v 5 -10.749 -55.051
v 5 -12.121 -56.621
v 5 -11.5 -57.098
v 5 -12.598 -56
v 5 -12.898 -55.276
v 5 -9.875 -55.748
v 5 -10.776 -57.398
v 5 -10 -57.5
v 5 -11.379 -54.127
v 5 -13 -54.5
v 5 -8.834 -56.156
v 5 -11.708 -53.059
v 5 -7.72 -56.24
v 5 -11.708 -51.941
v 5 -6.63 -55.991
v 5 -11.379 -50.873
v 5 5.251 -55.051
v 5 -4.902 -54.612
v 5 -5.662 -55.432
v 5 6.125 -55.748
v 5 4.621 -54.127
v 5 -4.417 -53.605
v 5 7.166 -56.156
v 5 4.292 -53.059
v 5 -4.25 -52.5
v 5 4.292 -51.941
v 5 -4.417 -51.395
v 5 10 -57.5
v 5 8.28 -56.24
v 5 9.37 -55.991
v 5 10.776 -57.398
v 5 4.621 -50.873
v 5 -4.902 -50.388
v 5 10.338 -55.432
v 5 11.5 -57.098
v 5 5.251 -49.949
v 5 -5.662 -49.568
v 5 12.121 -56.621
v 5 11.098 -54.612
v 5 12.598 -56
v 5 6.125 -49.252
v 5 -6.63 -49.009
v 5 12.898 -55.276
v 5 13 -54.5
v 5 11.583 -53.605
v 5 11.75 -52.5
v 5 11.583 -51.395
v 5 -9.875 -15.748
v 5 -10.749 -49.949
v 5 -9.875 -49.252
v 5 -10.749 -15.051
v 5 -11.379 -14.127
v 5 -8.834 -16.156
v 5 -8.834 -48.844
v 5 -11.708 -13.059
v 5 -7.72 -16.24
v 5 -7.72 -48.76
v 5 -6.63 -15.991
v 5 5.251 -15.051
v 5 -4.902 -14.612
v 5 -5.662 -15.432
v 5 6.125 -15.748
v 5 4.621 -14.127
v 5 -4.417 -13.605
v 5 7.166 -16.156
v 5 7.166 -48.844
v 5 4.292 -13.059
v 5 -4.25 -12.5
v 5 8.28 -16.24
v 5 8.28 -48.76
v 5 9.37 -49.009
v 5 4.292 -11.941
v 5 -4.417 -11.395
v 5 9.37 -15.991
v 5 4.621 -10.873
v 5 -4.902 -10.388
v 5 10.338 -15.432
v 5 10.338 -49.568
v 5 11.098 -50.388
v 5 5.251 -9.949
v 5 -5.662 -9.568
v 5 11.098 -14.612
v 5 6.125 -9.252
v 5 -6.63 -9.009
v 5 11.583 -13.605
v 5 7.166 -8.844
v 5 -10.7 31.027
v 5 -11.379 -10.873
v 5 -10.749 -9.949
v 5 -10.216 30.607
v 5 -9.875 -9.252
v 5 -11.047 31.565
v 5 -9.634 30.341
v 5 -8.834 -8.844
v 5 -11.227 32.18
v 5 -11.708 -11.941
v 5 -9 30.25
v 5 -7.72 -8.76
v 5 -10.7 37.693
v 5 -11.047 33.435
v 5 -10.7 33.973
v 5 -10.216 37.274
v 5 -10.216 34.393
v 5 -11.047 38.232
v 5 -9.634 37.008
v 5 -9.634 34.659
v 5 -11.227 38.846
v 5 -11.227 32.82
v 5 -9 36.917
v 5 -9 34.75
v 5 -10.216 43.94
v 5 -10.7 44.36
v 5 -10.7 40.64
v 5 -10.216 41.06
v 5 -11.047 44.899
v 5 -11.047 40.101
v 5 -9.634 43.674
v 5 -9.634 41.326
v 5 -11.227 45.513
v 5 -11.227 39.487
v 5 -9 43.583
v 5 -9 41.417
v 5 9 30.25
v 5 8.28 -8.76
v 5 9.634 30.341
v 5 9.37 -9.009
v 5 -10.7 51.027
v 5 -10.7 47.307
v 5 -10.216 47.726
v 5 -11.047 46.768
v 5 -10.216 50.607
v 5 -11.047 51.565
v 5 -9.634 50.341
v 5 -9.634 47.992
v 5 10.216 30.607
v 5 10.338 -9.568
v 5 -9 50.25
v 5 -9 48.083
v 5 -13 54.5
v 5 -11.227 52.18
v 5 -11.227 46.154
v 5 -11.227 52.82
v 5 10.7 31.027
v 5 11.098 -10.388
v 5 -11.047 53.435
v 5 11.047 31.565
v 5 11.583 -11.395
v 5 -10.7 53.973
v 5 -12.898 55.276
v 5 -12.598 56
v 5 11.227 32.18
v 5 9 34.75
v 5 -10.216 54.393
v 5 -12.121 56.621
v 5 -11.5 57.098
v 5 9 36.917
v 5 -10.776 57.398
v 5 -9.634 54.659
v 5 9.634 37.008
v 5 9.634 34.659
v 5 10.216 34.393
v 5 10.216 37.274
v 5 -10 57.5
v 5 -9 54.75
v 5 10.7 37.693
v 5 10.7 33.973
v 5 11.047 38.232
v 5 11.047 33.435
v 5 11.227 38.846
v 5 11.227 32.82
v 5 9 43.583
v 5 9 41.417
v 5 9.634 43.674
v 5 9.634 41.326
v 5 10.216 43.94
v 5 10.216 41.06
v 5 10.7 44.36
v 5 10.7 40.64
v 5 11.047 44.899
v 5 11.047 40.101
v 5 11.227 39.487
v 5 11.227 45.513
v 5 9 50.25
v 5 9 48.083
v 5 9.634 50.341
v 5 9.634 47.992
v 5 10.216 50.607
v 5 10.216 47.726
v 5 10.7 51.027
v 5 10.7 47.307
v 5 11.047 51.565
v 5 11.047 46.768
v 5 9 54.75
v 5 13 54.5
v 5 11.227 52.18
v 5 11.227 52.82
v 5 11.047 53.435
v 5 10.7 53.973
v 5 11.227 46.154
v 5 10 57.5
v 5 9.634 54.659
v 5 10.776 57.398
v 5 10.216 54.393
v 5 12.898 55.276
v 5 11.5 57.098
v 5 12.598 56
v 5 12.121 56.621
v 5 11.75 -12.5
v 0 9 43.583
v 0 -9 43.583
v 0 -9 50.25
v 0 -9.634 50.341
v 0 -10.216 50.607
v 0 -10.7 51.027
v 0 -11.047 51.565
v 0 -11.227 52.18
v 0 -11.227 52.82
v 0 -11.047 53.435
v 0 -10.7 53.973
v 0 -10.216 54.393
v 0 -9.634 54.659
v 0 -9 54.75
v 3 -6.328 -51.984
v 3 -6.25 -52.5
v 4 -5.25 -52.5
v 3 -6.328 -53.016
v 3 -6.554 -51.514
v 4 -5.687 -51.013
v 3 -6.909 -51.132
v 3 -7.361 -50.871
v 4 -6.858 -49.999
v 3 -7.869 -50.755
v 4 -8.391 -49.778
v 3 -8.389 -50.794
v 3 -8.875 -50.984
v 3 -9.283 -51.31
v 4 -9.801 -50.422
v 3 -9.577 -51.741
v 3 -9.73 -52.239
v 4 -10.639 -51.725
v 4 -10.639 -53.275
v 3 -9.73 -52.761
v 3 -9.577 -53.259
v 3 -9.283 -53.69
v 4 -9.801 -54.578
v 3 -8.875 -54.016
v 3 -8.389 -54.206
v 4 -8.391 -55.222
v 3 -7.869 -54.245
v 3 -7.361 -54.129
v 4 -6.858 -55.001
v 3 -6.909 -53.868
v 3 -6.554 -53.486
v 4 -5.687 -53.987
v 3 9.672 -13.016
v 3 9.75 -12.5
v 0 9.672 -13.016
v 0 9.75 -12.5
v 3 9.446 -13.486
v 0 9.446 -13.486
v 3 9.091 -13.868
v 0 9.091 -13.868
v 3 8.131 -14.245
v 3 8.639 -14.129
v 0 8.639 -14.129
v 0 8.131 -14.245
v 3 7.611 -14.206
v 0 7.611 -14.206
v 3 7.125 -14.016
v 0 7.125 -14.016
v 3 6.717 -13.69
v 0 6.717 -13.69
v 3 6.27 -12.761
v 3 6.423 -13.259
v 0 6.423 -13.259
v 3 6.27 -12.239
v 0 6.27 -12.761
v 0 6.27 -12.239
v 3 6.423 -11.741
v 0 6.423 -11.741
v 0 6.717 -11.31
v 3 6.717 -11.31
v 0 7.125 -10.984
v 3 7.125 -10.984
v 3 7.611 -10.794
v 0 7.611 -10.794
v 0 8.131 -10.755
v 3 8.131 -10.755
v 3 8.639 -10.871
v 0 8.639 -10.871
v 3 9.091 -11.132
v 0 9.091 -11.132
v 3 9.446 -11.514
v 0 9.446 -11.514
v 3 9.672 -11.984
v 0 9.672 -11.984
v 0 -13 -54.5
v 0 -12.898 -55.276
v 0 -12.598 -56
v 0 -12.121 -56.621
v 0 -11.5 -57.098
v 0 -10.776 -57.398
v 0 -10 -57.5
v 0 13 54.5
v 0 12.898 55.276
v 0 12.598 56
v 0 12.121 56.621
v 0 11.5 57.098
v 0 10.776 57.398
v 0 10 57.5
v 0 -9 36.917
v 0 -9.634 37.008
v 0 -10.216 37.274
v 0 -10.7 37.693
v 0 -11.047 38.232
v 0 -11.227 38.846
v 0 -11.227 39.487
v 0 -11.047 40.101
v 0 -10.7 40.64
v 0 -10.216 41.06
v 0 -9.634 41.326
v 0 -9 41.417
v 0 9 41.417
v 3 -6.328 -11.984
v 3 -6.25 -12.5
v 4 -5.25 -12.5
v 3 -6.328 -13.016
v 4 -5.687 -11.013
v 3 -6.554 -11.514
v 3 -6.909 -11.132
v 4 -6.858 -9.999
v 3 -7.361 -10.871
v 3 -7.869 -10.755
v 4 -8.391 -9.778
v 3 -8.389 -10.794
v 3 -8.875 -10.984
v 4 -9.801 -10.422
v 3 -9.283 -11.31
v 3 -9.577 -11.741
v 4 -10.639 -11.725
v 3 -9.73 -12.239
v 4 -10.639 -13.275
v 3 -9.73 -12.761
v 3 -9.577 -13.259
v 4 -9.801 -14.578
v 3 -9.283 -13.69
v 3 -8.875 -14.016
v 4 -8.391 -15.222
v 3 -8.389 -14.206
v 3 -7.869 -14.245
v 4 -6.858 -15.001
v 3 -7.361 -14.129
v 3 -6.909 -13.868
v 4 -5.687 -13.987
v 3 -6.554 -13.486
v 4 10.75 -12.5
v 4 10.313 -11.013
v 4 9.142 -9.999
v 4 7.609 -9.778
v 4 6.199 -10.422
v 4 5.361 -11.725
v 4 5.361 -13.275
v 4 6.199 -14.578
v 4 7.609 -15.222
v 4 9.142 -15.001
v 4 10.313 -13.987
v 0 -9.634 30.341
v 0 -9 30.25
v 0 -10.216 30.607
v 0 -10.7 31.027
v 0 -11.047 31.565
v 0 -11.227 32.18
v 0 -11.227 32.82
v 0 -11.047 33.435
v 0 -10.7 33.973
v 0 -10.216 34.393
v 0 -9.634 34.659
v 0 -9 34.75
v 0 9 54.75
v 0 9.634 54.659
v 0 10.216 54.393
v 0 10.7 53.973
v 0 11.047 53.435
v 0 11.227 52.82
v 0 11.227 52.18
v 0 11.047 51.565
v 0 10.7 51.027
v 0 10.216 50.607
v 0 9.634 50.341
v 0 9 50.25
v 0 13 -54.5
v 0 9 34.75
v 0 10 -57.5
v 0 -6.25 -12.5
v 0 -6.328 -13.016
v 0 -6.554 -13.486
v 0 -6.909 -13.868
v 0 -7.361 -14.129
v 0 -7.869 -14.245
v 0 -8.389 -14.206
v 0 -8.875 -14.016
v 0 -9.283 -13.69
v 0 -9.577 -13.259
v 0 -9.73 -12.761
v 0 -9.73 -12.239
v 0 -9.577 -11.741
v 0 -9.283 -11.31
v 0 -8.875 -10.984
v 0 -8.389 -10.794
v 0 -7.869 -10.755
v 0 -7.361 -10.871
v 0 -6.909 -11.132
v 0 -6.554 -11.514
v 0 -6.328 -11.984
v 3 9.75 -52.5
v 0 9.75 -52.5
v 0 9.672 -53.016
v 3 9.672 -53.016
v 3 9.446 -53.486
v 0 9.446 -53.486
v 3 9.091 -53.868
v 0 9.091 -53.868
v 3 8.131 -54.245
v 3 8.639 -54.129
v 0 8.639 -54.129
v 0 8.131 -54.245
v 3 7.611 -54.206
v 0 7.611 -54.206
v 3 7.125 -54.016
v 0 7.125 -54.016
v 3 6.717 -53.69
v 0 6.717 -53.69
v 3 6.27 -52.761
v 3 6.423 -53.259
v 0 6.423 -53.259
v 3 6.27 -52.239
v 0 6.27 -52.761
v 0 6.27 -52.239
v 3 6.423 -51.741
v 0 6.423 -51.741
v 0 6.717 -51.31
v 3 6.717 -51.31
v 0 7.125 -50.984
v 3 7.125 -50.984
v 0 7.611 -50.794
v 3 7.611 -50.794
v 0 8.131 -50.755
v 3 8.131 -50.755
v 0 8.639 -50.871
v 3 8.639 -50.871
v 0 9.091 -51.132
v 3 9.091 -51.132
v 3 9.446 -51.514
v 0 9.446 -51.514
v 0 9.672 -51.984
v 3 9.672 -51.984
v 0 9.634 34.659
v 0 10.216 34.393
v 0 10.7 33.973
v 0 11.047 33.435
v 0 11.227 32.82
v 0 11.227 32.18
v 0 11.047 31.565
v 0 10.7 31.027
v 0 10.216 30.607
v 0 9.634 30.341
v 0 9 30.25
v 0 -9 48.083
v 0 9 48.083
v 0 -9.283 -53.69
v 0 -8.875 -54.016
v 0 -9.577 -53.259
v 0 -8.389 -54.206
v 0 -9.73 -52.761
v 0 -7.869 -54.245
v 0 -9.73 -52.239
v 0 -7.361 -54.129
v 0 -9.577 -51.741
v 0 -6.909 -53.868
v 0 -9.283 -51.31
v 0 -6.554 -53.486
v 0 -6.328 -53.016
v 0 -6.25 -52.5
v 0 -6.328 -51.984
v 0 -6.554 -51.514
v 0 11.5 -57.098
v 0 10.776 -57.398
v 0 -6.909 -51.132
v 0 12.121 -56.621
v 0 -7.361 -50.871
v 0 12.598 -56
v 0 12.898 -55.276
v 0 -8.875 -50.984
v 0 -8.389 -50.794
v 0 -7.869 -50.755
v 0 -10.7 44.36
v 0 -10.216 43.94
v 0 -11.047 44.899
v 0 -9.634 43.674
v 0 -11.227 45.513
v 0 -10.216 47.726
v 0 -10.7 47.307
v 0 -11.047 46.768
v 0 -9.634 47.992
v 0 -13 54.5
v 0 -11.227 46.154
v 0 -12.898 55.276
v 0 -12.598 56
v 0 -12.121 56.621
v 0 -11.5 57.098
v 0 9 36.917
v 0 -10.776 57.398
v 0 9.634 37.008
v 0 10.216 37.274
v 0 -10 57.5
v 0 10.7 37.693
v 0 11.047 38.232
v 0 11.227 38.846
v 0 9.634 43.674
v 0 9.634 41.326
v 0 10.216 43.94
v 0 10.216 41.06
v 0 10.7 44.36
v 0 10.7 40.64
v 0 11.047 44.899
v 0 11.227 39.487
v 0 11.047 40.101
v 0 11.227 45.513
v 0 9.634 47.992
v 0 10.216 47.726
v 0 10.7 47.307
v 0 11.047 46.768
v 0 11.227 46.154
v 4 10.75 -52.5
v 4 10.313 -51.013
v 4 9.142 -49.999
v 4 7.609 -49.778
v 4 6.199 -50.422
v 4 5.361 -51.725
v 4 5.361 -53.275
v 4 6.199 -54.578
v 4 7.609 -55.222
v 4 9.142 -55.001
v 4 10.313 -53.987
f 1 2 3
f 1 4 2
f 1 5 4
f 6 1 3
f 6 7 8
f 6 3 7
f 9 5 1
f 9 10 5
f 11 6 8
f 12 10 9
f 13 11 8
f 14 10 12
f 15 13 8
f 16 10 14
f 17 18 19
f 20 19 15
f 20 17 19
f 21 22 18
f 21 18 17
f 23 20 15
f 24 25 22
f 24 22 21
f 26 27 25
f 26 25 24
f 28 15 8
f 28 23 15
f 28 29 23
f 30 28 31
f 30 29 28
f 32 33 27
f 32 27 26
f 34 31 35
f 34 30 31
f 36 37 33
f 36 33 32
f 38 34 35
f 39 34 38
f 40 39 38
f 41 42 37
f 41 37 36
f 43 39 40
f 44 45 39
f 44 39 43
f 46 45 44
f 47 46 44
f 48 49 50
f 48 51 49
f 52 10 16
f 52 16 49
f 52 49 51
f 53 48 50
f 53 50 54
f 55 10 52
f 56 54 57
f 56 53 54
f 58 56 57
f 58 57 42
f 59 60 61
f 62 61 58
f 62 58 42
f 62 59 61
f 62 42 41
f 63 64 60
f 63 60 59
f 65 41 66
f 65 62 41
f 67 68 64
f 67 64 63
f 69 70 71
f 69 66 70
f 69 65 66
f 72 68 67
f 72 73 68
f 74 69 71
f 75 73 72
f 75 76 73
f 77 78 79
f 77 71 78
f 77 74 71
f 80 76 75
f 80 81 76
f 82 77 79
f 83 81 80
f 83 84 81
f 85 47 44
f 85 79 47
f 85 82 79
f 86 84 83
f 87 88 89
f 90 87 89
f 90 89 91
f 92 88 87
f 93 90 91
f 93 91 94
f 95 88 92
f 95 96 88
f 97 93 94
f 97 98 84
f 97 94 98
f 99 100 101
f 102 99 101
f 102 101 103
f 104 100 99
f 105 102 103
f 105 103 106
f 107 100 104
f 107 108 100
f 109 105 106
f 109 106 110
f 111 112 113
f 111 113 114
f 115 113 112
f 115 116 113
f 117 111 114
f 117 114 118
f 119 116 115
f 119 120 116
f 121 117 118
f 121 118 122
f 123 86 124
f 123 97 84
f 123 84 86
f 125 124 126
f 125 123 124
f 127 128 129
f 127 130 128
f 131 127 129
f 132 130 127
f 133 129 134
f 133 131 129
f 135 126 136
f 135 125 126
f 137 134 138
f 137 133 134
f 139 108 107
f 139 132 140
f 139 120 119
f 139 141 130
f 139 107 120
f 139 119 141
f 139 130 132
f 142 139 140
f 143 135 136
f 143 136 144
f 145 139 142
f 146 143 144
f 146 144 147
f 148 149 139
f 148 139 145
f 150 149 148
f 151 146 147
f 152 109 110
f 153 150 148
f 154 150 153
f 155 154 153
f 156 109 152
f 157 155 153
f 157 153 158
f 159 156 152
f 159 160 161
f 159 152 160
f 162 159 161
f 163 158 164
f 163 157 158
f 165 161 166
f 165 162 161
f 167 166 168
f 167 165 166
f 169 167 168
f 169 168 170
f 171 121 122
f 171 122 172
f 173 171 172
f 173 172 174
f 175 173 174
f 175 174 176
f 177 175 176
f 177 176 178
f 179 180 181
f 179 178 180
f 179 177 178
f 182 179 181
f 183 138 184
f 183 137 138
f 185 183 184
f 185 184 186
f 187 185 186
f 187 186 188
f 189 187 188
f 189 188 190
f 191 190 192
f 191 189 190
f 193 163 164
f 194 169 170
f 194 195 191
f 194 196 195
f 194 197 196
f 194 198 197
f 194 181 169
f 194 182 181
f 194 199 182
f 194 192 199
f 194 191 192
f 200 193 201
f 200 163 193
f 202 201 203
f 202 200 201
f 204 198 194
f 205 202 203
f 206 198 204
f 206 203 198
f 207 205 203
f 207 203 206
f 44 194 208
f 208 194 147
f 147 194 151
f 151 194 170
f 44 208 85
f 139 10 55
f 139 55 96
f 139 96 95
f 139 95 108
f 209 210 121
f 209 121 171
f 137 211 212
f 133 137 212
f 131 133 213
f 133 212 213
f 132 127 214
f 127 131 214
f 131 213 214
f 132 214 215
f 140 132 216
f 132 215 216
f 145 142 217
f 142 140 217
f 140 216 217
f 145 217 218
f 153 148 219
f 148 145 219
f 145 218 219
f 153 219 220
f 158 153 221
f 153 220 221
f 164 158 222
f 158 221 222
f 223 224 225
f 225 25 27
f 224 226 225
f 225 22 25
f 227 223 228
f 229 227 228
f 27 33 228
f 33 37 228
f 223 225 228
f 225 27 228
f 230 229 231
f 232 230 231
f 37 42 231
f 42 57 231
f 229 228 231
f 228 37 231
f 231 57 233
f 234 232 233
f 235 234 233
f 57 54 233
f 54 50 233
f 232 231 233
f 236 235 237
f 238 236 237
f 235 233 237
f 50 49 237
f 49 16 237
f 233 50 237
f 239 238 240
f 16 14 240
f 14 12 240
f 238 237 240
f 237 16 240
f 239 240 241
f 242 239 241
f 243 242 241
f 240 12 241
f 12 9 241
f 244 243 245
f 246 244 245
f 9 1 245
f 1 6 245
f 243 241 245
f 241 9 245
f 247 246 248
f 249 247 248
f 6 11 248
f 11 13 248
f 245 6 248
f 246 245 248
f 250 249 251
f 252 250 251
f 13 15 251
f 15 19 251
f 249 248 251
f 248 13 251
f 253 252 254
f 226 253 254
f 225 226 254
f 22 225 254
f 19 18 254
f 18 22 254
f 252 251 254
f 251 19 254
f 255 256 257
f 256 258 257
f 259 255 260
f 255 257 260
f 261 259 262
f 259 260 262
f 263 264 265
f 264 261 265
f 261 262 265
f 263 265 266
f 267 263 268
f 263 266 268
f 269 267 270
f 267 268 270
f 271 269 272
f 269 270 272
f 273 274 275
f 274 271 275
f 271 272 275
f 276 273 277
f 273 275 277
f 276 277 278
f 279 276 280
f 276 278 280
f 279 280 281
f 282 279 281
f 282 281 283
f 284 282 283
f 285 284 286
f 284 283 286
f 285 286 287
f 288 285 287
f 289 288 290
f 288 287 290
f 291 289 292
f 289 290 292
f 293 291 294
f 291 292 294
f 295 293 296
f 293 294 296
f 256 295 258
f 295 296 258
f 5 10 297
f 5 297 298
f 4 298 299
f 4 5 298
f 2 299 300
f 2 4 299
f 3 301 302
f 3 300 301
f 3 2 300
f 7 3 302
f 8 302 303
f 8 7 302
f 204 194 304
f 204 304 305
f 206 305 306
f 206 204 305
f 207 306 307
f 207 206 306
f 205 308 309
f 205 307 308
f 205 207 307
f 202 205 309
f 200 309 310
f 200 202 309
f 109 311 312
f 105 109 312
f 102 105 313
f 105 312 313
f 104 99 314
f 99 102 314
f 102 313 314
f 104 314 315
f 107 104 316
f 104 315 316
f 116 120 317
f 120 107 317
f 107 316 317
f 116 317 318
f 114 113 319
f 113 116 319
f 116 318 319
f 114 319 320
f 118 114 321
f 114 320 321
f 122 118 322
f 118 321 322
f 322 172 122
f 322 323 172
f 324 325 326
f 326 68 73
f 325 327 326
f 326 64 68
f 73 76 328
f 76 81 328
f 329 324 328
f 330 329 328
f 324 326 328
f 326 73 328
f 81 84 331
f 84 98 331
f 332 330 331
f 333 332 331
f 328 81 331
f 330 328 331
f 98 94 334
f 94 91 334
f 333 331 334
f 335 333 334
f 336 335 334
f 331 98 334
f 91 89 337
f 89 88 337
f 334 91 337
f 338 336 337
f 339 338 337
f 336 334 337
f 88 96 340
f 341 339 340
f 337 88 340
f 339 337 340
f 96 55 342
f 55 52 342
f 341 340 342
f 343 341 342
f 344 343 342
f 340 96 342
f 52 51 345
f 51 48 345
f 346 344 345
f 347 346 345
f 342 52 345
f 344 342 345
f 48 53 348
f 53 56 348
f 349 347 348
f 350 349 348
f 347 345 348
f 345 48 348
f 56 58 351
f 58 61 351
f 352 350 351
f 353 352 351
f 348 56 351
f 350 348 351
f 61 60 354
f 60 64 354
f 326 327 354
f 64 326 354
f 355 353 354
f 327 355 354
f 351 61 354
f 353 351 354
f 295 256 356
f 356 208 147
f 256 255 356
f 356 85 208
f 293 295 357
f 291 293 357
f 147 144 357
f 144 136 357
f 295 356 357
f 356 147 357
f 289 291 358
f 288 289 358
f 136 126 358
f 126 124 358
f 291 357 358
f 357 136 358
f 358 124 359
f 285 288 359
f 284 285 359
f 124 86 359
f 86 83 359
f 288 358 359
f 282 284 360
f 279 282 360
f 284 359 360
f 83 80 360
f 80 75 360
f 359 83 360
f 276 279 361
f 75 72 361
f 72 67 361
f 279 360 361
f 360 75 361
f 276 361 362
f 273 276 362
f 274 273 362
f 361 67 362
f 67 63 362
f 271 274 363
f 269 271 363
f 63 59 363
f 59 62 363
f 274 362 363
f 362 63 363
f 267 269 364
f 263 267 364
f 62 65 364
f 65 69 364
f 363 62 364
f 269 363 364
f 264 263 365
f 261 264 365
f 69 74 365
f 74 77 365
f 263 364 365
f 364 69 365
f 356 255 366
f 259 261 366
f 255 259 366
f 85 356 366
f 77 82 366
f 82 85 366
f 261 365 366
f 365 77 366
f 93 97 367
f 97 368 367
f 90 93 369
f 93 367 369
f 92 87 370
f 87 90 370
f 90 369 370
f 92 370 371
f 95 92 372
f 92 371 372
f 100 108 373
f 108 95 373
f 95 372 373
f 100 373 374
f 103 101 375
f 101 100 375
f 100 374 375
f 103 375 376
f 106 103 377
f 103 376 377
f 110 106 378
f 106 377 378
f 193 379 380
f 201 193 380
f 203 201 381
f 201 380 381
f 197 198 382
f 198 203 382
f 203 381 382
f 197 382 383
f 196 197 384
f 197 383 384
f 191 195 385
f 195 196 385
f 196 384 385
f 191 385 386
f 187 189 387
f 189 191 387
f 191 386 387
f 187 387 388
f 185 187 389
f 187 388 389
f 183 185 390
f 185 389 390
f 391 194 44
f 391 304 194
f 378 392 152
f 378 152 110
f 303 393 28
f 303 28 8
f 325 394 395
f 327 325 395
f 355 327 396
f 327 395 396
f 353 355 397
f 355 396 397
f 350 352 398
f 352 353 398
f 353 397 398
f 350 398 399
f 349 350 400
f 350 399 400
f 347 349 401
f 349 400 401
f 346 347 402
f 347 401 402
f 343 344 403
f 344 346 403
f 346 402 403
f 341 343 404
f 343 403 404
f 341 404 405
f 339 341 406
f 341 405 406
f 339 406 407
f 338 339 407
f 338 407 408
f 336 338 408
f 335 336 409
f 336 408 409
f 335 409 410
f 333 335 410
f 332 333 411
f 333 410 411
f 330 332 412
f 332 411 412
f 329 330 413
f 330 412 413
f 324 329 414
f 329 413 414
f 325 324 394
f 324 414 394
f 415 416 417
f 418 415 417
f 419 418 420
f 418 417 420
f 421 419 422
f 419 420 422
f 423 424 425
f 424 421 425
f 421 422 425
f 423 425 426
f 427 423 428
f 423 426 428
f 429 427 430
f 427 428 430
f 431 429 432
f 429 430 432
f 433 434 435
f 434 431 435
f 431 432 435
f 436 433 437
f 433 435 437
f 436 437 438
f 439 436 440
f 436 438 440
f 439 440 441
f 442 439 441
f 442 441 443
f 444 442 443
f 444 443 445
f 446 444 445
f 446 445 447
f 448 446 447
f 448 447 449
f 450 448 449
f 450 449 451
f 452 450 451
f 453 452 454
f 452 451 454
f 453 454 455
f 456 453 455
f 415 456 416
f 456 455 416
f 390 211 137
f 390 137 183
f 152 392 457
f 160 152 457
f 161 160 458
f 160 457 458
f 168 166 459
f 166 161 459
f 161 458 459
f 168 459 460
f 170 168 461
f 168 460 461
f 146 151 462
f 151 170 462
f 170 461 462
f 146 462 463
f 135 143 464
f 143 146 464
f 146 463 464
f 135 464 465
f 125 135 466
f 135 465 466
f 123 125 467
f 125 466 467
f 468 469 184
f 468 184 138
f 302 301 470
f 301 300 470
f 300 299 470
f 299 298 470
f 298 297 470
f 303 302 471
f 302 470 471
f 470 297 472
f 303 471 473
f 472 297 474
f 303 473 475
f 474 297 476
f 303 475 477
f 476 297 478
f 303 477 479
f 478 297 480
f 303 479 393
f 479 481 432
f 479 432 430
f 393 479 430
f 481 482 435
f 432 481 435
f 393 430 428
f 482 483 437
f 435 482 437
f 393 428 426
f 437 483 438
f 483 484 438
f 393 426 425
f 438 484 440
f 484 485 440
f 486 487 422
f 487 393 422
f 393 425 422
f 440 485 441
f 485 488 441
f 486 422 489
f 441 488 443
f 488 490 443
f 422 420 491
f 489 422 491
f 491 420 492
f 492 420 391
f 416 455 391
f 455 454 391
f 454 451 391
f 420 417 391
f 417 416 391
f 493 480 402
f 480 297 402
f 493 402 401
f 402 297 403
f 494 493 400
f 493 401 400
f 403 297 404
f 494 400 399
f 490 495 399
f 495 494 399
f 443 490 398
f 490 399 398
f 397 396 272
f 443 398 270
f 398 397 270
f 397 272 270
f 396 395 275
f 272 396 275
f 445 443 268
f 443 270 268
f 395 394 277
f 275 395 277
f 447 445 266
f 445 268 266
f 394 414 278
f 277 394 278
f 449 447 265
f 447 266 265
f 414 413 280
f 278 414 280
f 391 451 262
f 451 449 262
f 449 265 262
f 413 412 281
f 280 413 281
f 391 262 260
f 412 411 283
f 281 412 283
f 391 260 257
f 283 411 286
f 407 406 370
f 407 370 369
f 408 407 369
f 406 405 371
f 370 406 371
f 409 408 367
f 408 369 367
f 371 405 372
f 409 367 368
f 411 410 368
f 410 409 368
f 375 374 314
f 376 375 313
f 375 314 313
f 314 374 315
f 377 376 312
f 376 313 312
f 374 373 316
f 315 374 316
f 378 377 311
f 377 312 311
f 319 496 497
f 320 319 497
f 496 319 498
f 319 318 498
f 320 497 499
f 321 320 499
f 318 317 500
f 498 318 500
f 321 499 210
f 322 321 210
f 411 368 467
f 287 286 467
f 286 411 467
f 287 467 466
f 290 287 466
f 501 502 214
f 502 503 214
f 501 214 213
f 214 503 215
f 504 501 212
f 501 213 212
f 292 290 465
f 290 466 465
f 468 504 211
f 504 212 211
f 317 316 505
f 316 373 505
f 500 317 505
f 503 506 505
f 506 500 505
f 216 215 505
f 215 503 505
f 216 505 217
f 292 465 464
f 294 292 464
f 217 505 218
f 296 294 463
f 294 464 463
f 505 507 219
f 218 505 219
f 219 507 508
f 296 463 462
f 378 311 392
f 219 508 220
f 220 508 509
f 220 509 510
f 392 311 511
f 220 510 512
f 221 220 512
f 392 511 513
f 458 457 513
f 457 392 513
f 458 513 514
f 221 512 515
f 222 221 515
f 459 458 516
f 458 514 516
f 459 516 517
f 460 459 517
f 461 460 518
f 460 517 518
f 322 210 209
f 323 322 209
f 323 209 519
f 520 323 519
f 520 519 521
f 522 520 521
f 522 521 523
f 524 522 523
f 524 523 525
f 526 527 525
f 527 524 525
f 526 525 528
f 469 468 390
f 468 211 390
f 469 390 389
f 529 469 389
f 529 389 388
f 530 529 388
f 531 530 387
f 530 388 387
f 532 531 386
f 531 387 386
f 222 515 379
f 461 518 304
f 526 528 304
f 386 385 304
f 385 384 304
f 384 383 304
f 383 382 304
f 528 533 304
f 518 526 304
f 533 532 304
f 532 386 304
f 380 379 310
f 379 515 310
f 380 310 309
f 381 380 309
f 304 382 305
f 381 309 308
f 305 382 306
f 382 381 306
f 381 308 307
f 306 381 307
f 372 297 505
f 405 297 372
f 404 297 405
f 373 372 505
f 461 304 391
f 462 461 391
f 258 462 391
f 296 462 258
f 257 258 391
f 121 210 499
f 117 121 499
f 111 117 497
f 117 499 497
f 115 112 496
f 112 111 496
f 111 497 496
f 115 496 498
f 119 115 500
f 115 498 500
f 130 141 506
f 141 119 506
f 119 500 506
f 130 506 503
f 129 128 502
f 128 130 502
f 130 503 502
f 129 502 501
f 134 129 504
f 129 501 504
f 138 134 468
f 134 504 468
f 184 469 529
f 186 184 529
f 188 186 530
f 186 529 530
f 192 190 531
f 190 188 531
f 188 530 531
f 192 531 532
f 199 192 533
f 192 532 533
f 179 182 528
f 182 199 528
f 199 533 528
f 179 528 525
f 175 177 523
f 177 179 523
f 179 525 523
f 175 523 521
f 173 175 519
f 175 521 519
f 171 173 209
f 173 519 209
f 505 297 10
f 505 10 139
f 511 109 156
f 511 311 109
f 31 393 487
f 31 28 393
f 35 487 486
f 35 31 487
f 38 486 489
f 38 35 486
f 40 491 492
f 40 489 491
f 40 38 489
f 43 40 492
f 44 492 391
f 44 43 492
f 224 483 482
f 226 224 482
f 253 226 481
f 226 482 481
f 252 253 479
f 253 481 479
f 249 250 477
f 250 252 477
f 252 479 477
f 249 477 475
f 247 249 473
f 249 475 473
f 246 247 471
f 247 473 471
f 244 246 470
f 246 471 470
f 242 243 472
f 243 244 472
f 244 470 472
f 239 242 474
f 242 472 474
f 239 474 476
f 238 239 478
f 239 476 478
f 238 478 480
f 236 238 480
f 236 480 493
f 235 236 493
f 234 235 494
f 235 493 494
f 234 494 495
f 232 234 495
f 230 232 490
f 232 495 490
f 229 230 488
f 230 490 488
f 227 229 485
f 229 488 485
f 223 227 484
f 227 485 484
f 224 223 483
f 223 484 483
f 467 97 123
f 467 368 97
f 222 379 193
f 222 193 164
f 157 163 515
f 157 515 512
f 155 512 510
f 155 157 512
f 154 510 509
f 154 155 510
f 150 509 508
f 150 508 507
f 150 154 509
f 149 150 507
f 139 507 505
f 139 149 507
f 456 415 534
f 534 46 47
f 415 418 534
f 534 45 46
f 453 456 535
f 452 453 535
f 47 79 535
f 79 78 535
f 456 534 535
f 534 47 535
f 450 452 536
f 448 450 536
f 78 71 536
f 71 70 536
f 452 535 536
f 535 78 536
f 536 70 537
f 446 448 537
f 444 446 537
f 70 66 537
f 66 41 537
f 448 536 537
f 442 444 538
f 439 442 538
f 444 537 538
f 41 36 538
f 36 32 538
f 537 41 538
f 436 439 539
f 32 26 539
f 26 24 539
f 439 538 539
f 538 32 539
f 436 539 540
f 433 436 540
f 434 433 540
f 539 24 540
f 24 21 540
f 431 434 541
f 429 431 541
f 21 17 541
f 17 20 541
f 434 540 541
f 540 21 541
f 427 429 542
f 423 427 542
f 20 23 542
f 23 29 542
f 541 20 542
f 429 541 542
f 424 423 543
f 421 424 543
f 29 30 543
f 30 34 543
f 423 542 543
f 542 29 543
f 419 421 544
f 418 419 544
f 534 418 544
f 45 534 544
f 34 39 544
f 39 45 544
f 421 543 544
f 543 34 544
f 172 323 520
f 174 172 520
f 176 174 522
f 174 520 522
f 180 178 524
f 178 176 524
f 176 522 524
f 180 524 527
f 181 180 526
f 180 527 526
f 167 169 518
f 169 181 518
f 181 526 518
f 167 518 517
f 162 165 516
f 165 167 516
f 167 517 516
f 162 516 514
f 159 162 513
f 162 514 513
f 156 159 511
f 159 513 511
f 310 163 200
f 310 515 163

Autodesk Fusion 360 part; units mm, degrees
sketch "Sketch1" plane through (0, 0, 0) normal (1, 0, 0) x (0, 1, 0)
  line L0 (-13, 57.5) -> (13, 57.5)
  line L1 (13, 57.5) -> (13, -57.5)
  line L2 (13, -57.5) -> (-13, -57.5)
  line L3 (-13, -57.5) -> (-13, 57.5)
  line L4 (-13, 57.5) -> (13, -57.5) construction
  line L5 (13, 57.5) -> (-13, -57.5) construction
  circle A0 centre (-8, -12.5) radius 1.75
  circle A1 centre (8, -12.5) radius 1.75
  circle A2 centre (8, -52.5) radius 1.75
  circle A3 centre (-8, -52.5) radius 1.75
  line L6 (-9, 30.25) -> (9, 30.25)
  arc A4 (9, 30.25) -> (9, 34.75) centre (9, 32.5) ccw
  line L7 (9, 34.75) -> (-9, 34.75)
  arc A5 (-9, 34.75) -> (-9, 30.25) centre (-9, 32.5) ccw
  line L8 (-9, 32.5) -> (9, 32.5) construction
  line L9 (0, 0) -> (0, 10)
  arc A6 (-9, 41.4167) -> (-9, 36.9167) centre (-9, 39.1667) ccw
  line L10 (9, 41.4167) -> (-9, 41.4167)
  line L11 (-9, 39.1667) -> (9, 39.1667) construction
  line L12 (-9, 36.9167) -> (9, 36.9167)
  arc A7 (9, 36.9167) -> (9, 41.4167) centre (9, 39.1667) ccw
  arc A8 (-9, 48.0833) -> (-9, 43.5833) centre (-9, 45.8333) ccw
  line L13 (9, 48.0833) -> (-9, 48.0833)
  line L14 (-9, 45.8333) -> (9, 45.8333) construction
  line L15 (-9, 43.5833) -> (9, 43.5833)
  arc A9 (9, 43.5833) -> (9, 48.0833) centre (9, 45.8333) ccw
  arc A10 (-9, 54.75) -> (-9, 50.25) centre (-9, 52.5) ccw
  line L16 (9, 54.75) -> (-9, 54.75)
  line L17 (-9, 52.5) -> (9, 52.5) construction
  line L18 (-9, 50.25) -> (9, 50.25)
  arc A11 (9, 50.25) -> (9, 54.75) centre (9, 52.5) ccw
  dimension "d1" = 16
  dimension "d2" = 40
  dimension "d3" = 3.5
  dimension "d4" = 5
  dimension "d5" = 8
  dimension "d6" = 5
  dimension "d7" = 70
  dimension "d9" = 4.5
  dimension "d10" = 45
  dimension "d11" = 9
  dimension "d12" = 18
  dimension "d15" = 20
  dimension "d16" = 0
extrude "Extrude1" add sketch "Sketch1" along normal blind 5
fillet "Fillet1" radius 3 4 edges at (2.5, -13, 57.5) (2.5, 13, 57.5) (2.5, -13, -57.5) (2.5, 13, -57.5)
chamfer "Chamfer1" distance 2 angle 45 1 edges at (5, -9.6316, -11.8672)
chamfer "Chamfer1" distance 2 angle 45 3 edges at (5, 6.3684, -11.8672) (5, -9.6316, -51.8672) (5, 6.3684, -51.8672)
equation "d5 = ( 16 / 2 ) * 1 mm"
